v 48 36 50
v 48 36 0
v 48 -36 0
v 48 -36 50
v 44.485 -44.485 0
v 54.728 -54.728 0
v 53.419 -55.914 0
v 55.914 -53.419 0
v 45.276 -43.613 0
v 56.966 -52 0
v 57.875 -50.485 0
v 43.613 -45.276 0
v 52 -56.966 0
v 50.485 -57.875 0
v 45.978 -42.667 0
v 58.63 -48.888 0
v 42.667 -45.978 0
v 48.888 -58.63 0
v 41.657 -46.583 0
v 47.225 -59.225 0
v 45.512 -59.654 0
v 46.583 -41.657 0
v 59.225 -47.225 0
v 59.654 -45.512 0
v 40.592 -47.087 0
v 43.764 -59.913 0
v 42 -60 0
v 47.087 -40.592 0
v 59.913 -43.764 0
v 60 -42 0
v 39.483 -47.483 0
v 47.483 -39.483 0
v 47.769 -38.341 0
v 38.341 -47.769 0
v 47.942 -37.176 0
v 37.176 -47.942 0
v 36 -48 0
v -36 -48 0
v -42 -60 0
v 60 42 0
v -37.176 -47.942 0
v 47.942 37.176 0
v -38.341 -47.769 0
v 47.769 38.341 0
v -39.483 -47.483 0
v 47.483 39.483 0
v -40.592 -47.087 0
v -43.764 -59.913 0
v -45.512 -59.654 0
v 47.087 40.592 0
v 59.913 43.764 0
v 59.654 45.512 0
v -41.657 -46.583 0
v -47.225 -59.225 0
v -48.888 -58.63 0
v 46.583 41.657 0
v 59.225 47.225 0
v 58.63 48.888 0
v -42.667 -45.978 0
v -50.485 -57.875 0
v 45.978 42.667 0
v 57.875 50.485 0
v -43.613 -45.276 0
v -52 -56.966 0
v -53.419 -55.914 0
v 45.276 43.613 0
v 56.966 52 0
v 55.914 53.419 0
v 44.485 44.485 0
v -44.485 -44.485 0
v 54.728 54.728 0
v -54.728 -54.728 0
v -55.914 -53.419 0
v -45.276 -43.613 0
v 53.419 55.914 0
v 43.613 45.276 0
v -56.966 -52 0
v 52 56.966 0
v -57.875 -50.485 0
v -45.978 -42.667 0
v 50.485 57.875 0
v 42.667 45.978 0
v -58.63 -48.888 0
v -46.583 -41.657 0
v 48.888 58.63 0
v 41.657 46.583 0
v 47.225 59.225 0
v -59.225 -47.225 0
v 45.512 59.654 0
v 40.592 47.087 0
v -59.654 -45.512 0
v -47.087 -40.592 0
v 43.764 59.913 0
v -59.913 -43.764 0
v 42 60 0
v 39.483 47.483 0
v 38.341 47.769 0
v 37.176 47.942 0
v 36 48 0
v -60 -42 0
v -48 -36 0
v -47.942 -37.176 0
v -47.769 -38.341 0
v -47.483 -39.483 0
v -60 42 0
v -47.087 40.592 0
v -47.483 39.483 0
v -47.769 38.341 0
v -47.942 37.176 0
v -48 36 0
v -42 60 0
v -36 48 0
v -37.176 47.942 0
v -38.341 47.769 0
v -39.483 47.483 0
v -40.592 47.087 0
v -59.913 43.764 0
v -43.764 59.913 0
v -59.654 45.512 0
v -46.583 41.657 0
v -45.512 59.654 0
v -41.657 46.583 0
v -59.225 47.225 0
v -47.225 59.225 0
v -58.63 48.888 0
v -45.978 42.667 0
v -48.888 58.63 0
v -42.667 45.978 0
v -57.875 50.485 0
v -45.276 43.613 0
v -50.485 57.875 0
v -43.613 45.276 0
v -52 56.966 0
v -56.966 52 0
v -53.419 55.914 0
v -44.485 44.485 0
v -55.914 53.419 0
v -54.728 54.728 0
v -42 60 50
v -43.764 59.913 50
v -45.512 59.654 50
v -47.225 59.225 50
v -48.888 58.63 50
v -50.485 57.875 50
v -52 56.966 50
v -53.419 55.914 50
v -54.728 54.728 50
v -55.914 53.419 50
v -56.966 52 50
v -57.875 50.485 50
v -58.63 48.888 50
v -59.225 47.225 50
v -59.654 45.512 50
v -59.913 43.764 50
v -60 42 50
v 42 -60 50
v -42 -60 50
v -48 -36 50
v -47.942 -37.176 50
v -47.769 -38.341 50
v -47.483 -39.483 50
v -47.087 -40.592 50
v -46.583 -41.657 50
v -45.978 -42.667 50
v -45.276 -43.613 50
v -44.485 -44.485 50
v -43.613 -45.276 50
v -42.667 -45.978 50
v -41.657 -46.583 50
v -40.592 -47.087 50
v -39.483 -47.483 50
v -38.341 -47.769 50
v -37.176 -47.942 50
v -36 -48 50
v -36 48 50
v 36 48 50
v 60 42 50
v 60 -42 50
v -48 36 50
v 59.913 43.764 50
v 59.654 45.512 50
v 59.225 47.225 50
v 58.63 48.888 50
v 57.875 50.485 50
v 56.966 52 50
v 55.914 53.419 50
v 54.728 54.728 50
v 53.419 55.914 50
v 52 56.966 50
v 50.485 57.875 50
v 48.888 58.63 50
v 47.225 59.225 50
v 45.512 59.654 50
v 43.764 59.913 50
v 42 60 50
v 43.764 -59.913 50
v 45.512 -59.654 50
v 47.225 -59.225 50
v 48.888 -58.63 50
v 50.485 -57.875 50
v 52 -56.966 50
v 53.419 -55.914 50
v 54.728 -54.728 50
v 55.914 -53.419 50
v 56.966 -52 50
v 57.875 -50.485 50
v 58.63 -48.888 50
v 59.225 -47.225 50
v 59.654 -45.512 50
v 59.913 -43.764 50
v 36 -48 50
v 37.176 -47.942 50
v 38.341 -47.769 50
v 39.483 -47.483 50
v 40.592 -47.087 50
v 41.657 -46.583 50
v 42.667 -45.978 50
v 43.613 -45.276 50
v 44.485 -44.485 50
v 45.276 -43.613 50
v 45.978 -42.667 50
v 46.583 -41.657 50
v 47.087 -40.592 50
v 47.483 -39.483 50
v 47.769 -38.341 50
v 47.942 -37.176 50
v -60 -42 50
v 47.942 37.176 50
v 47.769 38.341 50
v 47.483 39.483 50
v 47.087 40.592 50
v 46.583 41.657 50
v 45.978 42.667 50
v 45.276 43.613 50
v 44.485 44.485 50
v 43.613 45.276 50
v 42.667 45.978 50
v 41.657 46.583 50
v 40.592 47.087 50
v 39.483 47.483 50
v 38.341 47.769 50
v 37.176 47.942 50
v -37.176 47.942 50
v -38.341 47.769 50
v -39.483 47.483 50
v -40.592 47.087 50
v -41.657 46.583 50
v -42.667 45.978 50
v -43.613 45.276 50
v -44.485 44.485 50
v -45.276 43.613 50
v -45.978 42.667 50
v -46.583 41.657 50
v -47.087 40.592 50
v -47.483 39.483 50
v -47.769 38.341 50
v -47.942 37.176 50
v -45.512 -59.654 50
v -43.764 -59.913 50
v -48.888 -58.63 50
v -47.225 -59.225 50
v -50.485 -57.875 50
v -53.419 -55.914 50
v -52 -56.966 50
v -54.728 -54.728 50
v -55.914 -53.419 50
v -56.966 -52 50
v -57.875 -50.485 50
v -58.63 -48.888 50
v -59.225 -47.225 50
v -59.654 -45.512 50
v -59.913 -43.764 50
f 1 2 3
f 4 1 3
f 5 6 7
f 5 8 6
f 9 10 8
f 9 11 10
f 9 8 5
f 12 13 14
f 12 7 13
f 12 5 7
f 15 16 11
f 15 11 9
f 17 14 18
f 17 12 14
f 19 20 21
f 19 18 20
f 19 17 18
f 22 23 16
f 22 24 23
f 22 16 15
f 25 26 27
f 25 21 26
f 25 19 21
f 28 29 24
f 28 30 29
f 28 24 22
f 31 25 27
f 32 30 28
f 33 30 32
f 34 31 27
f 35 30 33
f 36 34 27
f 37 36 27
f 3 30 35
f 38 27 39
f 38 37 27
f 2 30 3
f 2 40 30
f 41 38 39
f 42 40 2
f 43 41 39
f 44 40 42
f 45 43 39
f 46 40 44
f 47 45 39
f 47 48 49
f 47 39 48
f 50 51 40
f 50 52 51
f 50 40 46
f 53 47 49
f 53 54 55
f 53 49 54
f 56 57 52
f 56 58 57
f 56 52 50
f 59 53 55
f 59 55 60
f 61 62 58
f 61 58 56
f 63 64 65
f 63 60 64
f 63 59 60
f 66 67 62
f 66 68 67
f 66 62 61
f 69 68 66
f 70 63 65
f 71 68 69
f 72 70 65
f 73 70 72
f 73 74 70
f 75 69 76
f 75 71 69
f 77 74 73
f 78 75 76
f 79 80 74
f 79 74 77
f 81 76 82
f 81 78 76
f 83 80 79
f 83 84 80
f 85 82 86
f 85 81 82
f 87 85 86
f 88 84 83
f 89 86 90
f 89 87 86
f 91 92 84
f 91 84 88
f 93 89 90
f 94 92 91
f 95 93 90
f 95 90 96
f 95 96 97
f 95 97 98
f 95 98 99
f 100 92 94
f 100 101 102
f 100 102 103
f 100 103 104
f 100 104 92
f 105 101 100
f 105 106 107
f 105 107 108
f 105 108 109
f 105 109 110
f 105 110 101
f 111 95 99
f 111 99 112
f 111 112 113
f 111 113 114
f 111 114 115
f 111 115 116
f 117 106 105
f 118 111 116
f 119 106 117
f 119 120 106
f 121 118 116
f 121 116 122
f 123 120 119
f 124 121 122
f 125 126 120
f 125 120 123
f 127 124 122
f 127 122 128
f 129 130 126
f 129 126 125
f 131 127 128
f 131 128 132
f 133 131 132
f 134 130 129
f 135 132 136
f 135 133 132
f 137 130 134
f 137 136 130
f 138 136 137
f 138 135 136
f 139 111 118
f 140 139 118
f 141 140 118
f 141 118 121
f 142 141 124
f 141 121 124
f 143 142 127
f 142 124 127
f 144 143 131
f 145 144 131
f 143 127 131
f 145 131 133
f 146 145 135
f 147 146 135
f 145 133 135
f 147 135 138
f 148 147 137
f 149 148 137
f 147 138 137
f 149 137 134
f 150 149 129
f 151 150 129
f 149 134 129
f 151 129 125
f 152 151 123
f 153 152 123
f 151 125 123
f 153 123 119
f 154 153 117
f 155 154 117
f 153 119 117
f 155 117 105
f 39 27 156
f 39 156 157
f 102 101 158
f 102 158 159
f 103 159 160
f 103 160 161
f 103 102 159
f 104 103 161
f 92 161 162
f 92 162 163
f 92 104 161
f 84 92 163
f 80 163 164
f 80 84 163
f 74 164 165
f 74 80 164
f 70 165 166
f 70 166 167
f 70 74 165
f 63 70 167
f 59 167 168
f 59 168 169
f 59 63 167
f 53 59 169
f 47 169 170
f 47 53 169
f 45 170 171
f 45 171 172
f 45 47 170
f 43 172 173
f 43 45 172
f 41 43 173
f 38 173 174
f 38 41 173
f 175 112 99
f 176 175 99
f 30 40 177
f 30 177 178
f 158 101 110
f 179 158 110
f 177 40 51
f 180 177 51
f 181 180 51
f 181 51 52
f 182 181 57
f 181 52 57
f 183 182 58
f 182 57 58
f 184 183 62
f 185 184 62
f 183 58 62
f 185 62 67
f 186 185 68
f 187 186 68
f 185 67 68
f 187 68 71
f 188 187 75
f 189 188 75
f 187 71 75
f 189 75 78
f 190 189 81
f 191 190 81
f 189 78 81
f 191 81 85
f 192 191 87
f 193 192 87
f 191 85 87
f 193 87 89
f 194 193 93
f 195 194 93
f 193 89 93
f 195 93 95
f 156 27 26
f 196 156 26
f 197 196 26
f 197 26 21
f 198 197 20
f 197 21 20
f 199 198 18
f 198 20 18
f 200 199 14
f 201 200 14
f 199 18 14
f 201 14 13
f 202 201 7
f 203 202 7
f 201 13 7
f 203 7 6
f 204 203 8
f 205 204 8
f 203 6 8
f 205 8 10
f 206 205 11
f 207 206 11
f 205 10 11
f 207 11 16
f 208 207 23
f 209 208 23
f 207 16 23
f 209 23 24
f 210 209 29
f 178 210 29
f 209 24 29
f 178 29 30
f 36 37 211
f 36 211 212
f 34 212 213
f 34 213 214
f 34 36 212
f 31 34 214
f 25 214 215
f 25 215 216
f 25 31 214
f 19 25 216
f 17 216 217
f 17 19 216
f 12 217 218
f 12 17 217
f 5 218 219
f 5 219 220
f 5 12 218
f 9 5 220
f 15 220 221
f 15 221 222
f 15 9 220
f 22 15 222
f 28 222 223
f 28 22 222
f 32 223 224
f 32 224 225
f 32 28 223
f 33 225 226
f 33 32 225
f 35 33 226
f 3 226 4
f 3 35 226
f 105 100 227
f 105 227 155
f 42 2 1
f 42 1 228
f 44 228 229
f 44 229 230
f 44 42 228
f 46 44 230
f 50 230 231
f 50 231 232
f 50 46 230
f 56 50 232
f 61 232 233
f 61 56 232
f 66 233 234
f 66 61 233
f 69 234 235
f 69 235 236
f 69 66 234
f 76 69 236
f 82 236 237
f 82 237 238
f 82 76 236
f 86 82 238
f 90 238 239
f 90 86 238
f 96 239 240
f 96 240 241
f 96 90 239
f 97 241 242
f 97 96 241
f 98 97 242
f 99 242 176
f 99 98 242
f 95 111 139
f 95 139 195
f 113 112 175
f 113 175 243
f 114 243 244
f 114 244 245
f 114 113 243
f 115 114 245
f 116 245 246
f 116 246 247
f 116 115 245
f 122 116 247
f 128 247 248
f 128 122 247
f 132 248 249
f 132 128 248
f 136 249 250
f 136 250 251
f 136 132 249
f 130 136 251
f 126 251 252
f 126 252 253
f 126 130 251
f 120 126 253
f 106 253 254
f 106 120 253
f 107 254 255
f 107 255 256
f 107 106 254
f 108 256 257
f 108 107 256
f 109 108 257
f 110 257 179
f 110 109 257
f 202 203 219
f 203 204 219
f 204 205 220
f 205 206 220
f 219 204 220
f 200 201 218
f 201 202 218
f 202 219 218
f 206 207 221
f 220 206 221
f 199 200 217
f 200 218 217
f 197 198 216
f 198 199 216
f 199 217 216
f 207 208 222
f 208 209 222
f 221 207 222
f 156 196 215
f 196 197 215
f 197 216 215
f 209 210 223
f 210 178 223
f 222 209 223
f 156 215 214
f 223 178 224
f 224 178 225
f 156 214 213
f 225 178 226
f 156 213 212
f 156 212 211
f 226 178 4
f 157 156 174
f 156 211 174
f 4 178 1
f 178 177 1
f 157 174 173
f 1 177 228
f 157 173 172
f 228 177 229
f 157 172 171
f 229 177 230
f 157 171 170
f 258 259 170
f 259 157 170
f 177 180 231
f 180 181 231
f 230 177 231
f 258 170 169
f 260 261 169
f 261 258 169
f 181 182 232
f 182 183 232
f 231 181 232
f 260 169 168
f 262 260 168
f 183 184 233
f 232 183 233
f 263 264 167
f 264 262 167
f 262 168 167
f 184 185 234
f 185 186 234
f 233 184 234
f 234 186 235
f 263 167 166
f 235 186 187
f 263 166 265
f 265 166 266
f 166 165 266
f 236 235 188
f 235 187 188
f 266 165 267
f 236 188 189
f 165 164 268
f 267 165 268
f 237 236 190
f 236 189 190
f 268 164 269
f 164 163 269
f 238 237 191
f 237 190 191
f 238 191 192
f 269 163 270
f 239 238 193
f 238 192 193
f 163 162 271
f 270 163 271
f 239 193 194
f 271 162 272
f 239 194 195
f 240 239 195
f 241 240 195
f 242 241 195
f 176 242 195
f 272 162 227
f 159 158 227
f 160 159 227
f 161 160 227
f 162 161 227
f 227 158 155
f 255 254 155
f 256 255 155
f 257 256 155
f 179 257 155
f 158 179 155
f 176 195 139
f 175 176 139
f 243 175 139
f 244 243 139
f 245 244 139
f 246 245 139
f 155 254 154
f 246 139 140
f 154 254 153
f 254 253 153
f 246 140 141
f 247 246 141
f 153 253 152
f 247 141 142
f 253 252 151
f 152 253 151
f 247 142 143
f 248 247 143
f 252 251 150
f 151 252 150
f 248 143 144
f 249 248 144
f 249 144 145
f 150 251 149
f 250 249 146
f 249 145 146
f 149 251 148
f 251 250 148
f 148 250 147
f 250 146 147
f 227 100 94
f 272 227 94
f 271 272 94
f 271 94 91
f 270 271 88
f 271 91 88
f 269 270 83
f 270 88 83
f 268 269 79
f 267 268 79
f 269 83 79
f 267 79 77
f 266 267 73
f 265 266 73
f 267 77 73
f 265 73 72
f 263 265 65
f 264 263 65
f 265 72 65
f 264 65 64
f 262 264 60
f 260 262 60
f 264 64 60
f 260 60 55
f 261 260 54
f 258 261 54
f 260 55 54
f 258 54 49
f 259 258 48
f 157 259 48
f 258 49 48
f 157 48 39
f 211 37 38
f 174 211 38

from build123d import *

# Parameters (mm, degrees)
EXTRUDE_DEPTH = 50


with BuildPart() as part:
    # Sketch → Extrude (new body)
    with BuildSketch(Plane.XY):
        with BuildLine():
            Line((-42, 60), (42, 60))
            ThreePointArc((60, 42), (54.727922, 54.727922), (42, 60))
            Line((60, 42), (60, -42))
            ThreePointArc((42, -60), (54.727922, -54.727922), (60, -42))
            Line((42, -60), (-42, -60))
            ThreePointArc((-60, -42), (-54.727922, -54.727922), (-42, -60))
            Line((-60, -42), (-60, 42))
            ThreePointArc((-42, 60), (-54.727922, 54.727922), (-60, 42))
        make_face()
        with BuildLine():
            Line((-36, 48), (36, 48))
            ThreePointArc((48, 36), (44.485281, 44.485281), (36, 48))
            Line((48, 36), (48, -36))
            ThreePointArc((36, -48), (44.485281, -44.485281), (48, -36))
            Line((36, -48), (-36, -48))
            ThreePointArc((-48, -36), (-44.485281, -44.485281), (-36, -48))
            Line((-48, -36), (-48, 36))
            ThreePointArc((-36, 48), (-44.485281, 44.485281), (-48, 36))
        make_face(mode=Mode.SUBTRACT)
    extrude(amount=EXTRUDE_DEPTH)


solid = part.part
